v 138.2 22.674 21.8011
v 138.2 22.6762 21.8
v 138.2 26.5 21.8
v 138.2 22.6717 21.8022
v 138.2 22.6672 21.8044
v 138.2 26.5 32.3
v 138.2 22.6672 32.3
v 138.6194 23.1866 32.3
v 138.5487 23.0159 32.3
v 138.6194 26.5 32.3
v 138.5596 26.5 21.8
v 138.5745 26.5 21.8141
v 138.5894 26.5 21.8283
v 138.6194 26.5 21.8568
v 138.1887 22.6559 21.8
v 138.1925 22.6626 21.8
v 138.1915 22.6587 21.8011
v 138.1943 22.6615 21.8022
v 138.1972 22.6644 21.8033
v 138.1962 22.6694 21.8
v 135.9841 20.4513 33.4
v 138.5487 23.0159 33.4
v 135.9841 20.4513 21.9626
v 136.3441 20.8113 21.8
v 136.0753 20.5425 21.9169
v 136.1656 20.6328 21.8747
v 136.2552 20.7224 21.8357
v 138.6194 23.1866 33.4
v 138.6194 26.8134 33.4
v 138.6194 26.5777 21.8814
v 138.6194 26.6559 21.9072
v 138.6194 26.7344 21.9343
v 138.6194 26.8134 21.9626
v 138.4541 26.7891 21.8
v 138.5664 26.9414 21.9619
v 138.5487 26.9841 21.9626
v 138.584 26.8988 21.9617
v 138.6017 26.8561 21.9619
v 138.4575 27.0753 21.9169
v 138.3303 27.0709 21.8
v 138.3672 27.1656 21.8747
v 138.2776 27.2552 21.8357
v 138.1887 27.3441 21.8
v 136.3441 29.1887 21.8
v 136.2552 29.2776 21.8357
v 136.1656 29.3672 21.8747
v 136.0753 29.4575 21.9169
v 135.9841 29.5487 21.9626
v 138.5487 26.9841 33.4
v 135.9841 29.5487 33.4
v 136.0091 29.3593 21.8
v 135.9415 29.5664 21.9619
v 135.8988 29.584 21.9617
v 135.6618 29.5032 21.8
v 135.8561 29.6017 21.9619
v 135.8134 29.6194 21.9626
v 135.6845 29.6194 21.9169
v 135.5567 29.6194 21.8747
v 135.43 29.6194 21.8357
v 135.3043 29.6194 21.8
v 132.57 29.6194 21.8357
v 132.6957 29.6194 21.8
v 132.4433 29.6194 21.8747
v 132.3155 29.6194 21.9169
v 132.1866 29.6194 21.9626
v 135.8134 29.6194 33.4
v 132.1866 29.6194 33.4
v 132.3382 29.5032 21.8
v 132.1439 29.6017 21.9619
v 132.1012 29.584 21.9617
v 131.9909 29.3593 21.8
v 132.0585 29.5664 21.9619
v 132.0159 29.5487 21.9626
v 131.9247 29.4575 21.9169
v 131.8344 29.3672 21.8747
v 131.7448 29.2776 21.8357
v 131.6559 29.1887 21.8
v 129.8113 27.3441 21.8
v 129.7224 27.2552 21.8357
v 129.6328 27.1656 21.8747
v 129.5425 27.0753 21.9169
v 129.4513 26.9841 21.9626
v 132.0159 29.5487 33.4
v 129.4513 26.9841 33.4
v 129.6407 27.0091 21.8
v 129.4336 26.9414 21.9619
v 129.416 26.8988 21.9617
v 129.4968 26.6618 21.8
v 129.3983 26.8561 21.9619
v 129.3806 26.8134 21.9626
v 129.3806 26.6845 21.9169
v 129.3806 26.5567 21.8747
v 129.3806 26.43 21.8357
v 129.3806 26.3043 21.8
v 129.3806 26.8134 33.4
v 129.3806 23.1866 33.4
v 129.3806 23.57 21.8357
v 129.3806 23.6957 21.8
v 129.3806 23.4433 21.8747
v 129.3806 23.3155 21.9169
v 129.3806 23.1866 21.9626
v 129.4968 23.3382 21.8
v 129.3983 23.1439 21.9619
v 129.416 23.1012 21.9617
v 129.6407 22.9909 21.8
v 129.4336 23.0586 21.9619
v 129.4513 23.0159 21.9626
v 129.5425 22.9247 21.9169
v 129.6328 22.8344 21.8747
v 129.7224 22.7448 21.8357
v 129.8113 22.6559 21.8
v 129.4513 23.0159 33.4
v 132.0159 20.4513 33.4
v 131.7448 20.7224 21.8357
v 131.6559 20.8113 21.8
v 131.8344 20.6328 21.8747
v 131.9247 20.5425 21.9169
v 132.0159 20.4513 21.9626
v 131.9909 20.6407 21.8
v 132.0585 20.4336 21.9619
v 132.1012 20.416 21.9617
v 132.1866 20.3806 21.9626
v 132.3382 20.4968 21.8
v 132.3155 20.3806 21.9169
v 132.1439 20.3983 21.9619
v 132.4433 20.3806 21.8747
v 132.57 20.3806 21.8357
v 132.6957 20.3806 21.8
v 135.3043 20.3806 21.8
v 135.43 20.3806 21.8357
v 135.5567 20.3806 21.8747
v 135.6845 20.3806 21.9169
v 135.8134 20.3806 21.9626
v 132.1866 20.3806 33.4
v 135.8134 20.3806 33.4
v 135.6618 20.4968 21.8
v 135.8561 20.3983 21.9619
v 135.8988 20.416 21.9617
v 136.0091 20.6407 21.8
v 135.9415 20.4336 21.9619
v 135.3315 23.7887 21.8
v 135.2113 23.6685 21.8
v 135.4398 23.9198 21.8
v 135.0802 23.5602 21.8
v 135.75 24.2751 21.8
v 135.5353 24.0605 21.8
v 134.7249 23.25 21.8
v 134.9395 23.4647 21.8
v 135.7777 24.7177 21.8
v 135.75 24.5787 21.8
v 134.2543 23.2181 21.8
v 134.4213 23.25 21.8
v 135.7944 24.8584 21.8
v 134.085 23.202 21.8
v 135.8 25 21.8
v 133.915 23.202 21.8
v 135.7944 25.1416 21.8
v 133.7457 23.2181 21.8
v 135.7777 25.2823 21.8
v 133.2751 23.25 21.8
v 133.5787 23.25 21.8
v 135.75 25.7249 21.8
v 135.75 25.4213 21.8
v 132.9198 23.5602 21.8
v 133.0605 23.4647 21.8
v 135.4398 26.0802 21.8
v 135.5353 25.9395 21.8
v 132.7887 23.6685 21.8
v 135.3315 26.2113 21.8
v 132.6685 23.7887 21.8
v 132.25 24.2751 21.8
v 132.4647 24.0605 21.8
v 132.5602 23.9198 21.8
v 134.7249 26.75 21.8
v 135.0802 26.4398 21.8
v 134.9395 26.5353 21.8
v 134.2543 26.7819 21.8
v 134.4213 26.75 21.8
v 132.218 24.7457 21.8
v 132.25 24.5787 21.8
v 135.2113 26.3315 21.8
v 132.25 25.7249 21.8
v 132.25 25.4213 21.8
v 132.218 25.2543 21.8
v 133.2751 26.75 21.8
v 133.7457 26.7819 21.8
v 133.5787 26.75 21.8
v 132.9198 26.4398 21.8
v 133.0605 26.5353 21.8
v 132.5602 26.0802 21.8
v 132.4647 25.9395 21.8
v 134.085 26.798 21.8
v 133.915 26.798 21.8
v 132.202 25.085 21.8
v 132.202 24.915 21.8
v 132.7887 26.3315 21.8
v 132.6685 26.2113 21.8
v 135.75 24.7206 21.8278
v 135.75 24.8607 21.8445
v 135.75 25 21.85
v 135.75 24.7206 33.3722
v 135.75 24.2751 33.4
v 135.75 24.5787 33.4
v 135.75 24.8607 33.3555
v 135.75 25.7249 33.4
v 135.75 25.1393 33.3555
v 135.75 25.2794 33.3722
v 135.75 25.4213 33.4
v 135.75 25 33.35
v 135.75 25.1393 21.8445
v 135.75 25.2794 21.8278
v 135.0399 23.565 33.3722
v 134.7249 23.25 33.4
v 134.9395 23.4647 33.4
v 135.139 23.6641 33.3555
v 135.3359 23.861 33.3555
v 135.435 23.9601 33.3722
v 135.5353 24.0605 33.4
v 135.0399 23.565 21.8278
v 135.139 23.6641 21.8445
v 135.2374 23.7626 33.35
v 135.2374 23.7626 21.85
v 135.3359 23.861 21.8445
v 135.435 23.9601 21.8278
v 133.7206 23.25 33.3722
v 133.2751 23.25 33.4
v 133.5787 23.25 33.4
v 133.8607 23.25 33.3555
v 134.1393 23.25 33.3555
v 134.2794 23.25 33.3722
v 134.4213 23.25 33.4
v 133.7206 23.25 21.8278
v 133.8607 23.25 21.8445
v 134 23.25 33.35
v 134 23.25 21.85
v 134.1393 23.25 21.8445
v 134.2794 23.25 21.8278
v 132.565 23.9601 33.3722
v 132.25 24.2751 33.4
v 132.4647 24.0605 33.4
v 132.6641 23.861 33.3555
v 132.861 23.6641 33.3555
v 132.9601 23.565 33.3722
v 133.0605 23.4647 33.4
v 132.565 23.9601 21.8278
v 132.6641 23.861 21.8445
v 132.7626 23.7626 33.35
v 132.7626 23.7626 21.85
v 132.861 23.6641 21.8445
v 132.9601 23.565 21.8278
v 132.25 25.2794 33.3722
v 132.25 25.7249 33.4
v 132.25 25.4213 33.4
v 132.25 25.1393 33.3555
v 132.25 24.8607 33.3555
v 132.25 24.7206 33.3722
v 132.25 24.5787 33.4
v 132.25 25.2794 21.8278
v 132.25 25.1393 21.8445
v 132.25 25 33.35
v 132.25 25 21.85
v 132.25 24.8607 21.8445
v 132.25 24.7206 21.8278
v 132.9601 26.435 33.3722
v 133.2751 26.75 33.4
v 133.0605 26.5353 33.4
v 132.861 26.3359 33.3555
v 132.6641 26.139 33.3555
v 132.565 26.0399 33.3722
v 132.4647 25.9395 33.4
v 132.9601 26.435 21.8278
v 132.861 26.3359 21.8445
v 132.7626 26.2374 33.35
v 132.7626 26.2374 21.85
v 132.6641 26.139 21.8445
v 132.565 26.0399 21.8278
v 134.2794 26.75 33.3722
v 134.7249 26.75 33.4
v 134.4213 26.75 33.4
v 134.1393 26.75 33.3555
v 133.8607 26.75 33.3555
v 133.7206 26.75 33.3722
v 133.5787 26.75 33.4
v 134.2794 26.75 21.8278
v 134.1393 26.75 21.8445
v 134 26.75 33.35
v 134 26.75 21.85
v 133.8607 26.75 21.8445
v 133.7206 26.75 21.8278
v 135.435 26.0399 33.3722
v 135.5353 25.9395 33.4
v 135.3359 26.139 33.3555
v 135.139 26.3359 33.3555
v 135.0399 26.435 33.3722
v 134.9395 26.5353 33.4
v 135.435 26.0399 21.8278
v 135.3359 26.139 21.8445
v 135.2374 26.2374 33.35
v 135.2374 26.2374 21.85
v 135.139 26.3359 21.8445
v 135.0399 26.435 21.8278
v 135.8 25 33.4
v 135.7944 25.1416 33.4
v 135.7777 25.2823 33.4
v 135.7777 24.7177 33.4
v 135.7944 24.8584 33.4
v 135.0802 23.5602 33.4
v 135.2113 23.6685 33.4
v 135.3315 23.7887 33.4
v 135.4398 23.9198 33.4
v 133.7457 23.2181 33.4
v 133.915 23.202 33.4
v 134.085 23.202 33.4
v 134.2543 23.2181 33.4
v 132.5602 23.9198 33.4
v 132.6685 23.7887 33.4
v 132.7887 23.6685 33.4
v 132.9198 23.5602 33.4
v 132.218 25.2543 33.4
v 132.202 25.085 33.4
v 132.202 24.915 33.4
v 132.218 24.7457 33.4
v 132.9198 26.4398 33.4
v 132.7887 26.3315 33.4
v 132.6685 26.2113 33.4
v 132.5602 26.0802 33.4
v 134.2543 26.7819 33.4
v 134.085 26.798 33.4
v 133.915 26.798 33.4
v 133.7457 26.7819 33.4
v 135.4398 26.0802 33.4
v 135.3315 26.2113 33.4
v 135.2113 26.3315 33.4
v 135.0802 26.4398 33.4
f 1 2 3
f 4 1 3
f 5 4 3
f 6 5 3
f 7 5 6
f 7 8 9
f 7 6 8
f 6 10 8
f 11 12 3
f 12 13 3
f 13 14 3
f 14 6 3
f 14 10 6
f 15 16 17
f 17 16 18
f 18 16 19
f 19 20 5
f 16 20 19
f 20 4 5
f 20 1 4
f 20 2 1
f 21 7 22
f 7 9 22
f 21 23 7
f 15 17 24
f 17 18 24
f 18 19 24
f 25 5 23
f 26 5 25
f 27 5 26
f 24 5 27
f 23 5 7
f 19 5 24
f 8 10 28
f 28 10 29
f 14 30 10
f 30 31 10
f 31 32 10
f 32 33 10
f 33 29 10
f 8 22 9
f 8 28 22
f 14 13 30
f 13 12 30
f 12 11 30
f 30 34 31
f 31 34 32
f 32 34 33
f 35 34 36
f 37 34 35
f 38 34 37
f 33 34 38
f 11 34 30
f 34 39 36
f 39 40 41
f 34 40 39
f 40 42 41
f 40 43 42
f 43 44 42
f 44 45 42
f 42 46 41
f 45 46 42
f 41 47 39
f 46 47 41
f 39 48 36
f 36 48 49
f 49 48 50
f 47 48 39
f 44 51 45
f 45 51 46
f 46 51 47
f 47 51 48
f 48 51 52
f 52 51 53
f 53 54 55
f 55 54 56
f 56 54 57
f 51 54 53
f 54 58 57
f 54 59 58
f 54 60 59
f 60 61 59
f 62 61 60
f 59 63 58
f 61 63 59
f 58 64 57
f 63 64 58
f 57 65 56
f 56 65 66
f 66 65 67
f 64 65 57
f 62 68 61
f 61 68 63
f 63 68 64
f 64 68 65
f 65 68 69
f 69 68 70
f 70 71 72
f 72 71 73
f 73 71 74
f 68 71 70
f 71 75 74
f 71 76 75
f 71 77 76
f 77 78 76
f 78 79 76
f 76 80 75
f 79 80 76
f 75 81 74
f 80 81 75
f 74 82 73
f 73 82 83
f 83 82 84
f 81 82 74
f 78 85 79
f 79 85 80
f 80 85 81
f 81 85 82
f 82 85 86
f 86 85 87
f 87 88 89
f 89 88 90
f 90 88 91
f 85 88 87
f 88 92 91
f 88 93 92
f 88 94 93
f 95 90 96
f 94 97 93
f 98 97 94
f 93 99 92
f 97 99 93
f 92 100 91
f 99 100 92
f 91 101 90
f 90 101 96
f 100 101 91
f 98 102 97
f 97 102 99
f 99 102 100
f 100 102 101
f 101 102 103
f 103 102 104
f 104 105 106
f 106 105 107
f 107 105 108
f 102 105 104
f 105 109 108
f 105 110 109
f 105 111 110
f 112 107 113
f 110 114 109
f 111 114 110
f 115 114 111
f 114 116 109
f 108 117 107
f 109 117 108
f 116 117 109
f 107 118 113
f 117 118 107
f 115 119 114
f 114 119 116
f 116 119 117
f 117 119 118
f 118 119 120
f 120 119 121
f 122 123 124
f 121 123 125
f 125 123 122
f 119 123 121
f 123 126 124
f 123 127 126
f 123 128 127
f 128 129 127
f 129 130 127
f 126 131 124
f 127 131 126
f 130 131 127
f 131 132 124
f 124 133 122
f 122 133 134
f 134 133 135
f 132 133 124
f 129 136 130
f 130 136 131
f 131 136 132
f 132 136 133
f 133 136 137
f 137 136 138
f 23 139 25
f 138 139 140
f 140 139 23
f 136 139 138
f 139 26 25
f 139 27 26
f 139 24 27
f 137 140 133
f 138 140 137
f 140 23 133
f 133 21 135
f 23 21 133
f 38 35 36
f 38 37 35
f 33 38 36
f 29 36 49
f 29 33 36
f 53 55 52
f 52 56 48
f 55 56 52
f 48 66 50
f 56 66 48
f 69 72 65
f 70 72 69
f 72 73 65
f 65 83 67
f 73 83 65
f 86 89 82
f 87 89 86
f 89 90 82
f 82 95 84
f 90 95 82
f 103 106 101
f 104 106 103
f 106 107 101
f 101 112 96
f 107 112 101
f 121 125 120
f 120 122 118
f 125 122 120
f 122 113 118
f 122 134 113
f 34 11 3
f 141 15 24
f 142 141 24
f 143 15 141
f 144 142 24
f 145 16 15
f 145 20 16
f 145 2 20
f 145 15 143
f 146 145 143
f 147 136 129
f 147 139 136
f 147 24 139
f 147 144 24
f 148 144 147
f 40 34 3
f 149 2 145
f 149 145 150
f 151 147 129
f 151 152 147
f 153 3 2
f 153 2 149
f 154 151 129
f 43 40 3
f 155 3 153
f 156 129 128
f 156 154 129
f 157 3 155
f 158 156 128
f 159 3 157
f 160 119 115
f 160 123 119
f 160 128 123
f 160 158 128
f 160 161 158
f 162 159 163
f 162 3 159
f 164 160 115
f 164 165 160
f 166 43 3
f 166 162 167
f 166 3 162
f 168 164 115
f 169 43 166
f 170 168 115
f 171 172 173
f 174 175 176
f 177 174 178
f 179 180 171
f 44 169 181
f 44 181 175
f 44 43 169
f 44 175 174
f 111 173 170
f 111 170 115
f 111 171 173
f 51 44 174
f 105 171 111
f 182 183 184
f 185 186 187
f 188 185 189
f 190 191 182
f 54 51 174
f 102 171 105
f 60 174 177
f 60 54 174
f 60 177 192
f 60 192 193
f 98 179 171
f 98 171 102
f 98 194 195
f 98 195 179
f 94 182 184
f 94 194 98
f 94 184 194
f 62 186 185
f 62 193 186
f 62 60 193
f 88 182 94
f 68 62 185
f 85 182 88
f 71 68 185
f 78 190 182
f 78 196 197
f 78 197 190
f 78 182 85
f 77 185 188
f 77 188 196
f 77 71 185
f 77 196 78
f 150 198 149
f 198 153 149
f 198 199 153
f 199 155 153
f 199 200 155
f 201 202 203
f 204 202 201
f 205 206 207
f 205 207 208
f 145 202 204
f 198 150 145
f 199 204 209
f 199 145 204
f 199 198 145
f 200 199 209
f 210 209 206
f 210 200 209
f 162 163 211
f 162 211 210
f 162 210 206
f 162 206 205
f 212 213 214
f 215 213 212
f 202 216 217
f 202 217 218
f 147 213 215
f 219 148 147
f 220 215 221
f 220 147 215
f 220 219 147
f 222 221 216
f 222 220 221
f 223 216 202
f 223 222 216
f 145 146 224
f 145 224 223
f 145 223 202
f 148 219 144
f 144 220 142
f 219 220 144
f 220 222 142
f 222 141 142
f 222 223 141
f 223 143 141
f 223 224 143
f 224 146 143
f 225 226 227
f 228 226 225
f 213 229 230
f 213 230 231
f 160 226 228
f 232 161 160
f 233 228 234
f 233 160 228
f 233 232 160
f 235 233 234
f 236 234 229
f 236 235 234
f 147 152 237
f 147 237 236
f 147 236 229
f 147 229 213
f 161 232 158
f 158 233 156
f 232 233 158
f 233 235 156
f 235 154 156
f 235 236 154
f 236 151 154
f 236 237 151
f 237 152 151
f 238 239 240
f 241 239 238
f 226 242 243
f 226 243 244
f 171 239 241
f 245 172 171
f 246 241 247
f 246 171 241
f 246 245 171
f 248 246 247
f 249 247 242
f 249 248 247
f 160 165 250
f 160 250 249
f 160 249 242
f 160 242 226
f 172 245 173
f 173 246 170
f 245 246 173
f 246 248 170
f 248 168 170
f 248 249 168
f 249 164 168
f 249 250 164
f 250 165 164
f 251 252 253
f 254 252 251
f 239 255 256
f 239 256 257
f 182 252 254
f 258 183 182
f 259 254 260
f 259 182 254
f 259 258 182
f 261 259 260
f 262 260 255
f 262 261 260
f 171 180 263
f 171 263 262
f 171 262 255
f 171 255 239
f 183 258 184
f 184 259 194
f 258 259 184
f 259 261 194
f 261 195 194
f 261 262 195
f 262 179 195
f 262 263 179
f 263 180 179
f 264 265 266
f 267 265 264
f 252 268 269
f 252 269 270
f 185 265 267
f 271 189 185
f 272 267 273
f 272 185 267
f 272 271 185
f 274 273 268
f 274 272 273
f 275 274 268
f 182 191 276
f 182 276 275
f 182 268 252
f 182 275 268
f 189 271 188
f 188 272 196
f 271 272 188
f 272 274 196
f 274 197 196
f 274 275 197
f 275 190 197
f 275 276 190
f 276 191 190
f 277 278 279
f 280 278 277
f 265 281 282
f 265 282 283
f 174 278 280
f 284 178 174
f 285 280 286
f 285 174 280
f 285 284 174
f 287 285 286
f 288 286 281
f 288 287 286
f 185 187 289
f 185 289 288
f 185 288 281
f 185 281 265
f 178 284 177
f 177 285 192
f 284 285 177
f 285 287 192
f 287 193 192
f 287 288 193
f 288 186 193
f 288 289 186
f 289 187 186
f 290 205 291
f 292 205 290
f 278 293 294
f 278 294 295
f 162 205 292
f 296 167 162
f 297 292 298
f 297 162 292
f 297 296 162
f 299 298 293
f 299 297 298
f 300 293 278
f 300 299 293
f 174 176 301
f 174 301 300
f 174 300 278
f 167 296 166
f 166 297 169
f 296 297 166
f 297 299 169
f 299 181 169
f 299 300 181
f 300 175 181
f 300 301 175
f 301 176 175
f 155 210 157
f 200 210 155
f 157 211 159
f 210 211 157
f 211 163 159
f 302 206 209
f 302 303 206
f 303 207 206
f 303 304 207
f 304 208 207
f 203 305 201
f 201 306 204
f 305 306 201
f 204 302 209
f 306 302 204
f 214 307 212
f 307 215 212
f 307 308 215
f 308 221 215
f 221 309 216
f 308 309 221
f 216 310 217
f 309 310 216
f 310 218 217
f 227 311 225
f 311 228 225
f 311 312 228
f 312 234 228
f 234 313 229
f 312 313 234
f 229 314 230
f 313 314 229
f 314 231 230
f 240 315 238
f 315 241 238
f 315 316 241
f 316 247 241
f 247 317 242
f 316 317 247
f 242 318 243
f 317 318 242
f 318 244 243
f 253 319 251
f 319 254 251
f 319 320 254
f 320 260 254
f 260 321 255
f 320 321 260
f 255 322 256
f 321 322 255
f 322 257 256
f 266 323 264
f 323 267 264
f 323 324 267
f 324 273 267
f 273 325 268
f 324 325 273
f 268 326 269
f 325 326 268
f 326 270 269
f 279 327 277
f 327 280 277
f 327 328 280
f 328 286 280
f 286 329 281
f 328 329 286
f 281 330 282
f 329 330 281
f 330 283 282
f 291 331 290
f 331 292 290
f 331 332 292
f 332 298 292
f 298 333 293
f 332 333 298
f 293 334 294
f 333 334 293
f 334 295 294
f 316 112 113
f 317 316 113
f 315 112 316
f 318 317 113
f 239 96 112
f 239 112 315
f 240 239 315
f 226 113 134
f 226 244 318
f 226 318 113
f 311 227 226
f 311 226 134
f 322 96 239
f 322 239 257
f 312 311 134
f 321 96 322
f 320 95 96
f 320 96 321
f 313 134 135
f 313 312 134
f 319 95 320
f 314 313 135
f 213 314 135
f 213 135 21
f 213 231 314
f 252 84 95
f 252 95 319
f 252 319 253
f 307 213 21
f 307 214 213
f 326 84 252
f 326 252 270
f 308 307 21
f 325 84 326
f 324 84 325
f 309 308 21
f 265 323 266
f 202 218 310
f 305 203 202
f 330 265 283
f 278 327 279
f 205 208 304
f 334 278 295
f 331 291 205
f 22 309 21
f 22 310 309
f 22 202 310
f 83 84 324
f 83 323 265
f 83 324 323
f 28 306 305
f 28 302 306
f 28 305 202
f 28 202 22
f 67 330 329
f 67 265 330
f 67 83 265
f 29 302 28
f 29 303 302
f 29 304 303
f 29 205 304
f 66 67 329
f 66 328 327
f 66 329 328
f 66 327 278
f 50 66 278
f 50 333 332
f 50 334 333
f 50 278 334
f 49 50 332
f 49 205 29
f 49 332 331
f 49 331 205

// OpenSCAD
// Generated by the canonical parent Python sources and validated exchange pipeline.
polyhedron(points=[[138.1999969482422, 22.673954010009766, 21.80109214782715], [138.1999969482422, 22.676210403442383, 21.799999237060547], [138.1999969482422, 26.5, 21.799999237060547], [138.1999969482422, 22.67169952392578, 21.80218505859375], [138.1999969482422, 22.667184829711914, 21.80437469482422], [138.1999969482422, 26.5, 32.29999923706055], [138.1999969482422, 22.667184829711914, 32.29999923706055], [138.61940002441406, 23.186582565307617, 32.29999923706055], [138.54869079589844, 23.015872955322266, 32.29999923706055], [138.61940002441406, 26.5, 32.29999923706055], [138.55960083007812, 26.5, 21.799999237060547], [138.57449340820312, 26.5, 21.814138412475586], [138.58941650390625, 26.5, 21.828325271606445], [138.61940002441406, 26.5, 21.856834411621094], [138.1886749267578, 22.65586280822754, 21.799999237060547], [138.1924591064453, 22.662639617919922, 21.799999237060547], [138.19151306152344, 22.658693313598633, 21.801088333129883], [138.1943359375, 22.661521911621094, 21.802181243896484], [138.19717407226562, 22.66435432434082, 21.80327606201172], [138.1962432861328, 22.669422149658203, 21.799999237060547], [135.984130859375, 20.451313018798828, 33.400001525878906], [138.54869079589844, 23.015872955322266, 33.400001525878906], [135.984130859375, 20.451313018798828, 21.96259117126465], [136.34413146972656, 20.811323165893555, 21.799999237060547], [136.07528686523438, 20.542470932006836, 21.916948318481445], [136.16563415527344, 20.6328182220459, 21.874652862548828], [136.25523376464844, 20.722414016723633, 21.83568000793457], [138.61940002441406, 23.186582565307617, 33.400001525878906], [138.61940002441406, 26.813417434692383, 33.400001525878906], [138.61940002441406, 26.57773208618164, 21.88140106201172], [138.61940002441406, 26.655864715576172, 21.907211303710938], [138.61940002441406, 26.734418869018555, 21.93427276611328], [138.61940002441406, 26.813417434692383, 21.96259117126465], [138.4541015625, 26.789119720458984, 21.799999237060547], [138.5663604736328, 26.941448211669922, 21.961946487426758], [138.54869079589844, 26.984127044677734, 21.96259117126465], [138.58404541015625, 26.898773193359375, 21.96173095703125], [138.60171508789062, 26.856096267700195, 21.961946487426758], [138.45753479003906, 27.075284957885742, 21.916948318481445], [138.33029174804688, 27.070884704589844, 21.799999237060547], [138.3671875, 27.165632247924805, 21.874652862548828], [138.277587890625, 27.255229949951172, 21.83568000793457], [138.1886749267578, 27.34413719177246, 21.799999237060547], [136.34413146972656, 29.188676834106445, 21.799999237060547], [136.25523376464844, 29.277585983276367, 21.83568000793457], [136.16563415527344, 29.3671817779541, 21.874652862548828], [136.07528686523438, 29.457529067993164, 21.916948318481445], [135.984130859375, 29.548686981201172, 21.96259117126465], [138.54869079589844, 26.984127044677734, 33.400001525878906], [135.984130859375, 29.548686981201172, 33.400001525878906], [136.00914001464844, 29.35928726196289, 21.799999237060547], [135.9414520263672, 29.56636619567871, 21.961946487426758], [135.89877319335938, 29.584041595458984, 21.96173095703125], [135.66180419921875, 29.50315284729004, 21.799999237060547], [135.85609436035156, 29.60171890258789, 21.961946487426758], [135.81341552734375, 29.61939811706543, 21.96259117126465], [135.6844940185547, 29.61939811706543, 21.916948318481445], [135.55673217773438, 29.61939811706543, 21.874652862548828], [135.43002319335938, 29.61939811706543, 21.83568000793457], [135.30429077148438, 29.61939811706543, 21.799999237060547], [132.56997680664062, 29.61939811706543, 21.83568000793457], [132.69570922851562, 29.61939811706543, 21.799999237060547], [132.44326782226562, 29.61939811706543, 21.874652862548828], [132.3155059814453, 29.61939811706543, 21.916948318481445], [132.18658447265625, 29.61939811706543, 21.96259117126465], [135.81341552734375, 29.61939811706543, 33.400001525878906], [132.18658447265625, 29.61939811706543, 33.400001525878906], [132.33819580078125, 29.50315284729004, 21.799999237060547], [132.14390563964844, 29.60171890258789, 21.961946487426758], [132.10122680664062, 29.584041595458984, 21.96173095703125], [131.99085998535156, 29.35928726196289, 21.799999237060547], [132.0585479736328, 29.56636619567871, 21.961946487426758], [132.015869140625, 29.548686981201172, 21.96259117126465], [131.92471313476562, 29.457529067993164, 21.916948318481445], [131.83436584472656, 29.3671817779541, 21.874652862548828], [131.74476623535156, 29.277585983276367, 21.83568000793457], [131.65586853027344, 29.188676834106445, 21.799999237060547], [129.8113250732422, 27.34413719177246, 21.799999237060547], [129.722412109375, 27.255229949951172, 21.83568000793457], [129.6328125, 27.165632247924805, 21.874652862548828], [129.54246520996094, 27.075284957885742, 21.916948318481445], [129.45130920410156, 26.984127044677734, 21.96259117126465], [132.015869140625, 29.548686981201172, 33.400001525878906], [129.45130920410156, 26.984127044677734, 33.400001525878906], [129.64071655273438, 27.00913429260254, 21.799999237060547], [129.4336395263672, 26.941448211669922, 21.961946487426758], [129.41595458984375, 26.898773193359375, 21.96173095703125], [129.49684143066406, 26.661808013916016, 21.799999237060547], [129.39828491210938, 26.856096267700195, 21.961946487426758], [129.38059997558594, 26.813417434692383, 21.96259117126465], [129.38059997558594, 26.684499740600586, 21.916948318481445], [129.38059997558594, 26.556730270385742, 21.874652862548828], [129.38059997558594, 26.430021286010742, 21.83568000793457], [129.38059997558594, 26.30428695678711, 21.799999237060547], [129.38059997558594, 26.813417434692383, 33.400001525878906], [129.38059997558594, 23.186582565307617, 33.400001525878906], [129.38059997558594, 23.569978713989258, 21.83568000793457], [129.38059997558594, 23.69571304321289, 21.799999237060547], [129.38059997558594, 23.443269729614258, 21.874652862548828], [129.38059997558594, 23.315500259399414, 21.916948318481445], [129.38059997558594, 23.186582565307617, 21.96259117126465], [129.49684143066406, 23.338191986083984, 21.799999237060547], [129.39828491210938, 23.143903732299805, 21.961946487426758], [129.41595458984375, 23.101226806640625, 21.96173095703125], [129.64071655273438, 22.99086570739746, 21.799999237060547], [129.4336395263672, 23.058551788330078, 21.961946487426758], [129.45130920410156, 23.015872955322266, 21.96259117126465], [129.54246520996094, 22.924715042114258, 21.916948318481445], [129.6328125, 22.834367752075195, 21.874652862548828], [129.722412109375, 22.744770050048828, 21.83568000793457], [129.8113250732422, 22.65586280822754, 21.799999237060547], [129.45130920410156, 23.015872955322266, 33.400001525878906], [132.015869140625, 20.451313018798828, 33.400001525878906], [131.74476623535156, 20.722414016723633, 21.83568000793457], [131.65586853027344, 20.811323165893555, 21.799999237060547], [131.83436584472656, 20.6328182220459, 21.874652862548828], [131.92471313476562, 20.542470932006836, 21.916948318481445], [132.015869140625, 20.451313018798828, 21.96259117126465], [131.99085998535156, 20.64071273803711, 21.799999237060547], [132.0585479736328, 20.43363380432129, 21.961946487426758], [132.10122680664062, 20.415958404541016, 21.96173095703125], [132.18658447265625, 20.38060188293457, 21.96259117126465], [132.33819580078125, 20.49684715270996, 21.799999237060547], [132.3155059814453, 20.38060188293457, 21.916948318481445], [132.14390563964844, 20.39828109741211, 21.961946487426758], [132.44326782226562, 20.38060188293457, 21.874652862548828], [132.56997680664062, 20.38060188293457, 21.83568000793457], [132.69570922851562, 20.38060188293457, 21.799999237060547], [135.30429077148438, 20.38060188293457, 21.799999237060547], [135.43002319335938, 20.38060188293457, 21.83568000793457], [135.55673217773438, 20.38060188293457, 21.874652862548828], [135.6844940185547, 20.38060188293457, 21.916948318481445], [135.81341552734375, 20.38060188293457, 21.96259117126465], [132.18658447265625, 20.38060188293457, 33.400001525878906], [135.81341552734375, 20.38060188293457, 33.400001525878906], [135.66180419921875, 20.49684715270996, 21.799999237060547], [135.85609436035156, 20.39828109741211, 21.961946487426758], [135.89877319335938, 20.415958404541016, 21.96173095703125], [136.00914001464844, 20.64071273803711, 21.799999237060547], [135.9414520263672, 20.43363380432129, 21.961946487426758], [135.33148193359375, 23.788745880126953, 21.799999237060547], [135.2112579345703, 23.66851043701172, 21.799999237060547], [135.43983459472656, 23.919790267944336, 21.799999237060547], [135.08021545410156, 23.560157775878906, 21.799999237060547], [135.75, 24.27512550354004, 21.799999237060547], [135.53533935546875, 24.06047248840332, 21.799999237060547], [134.72486877441406, 23.25, 21.799999237060547], [134.9395294189453, 23.46465301513672, 21.799999237060547], [135.77772521972656, 24.717668533325195, 21.799999237060547], [135.75, 24.578693389892578, 21.799999237060547], [134.25430297851562, 23.218053817749023, 21.799999237060547], [134.4213104248047, 23.25, 21.799999237060547], [135.79441833496094, 24.858396530151367, 21.799999237060547], [134.08502197265625, 23.202009201049805, 21.799999237060547], [135.8000030517578, 25.0, 21.799999237060547], [133.91497802734375, 23.202009201049805, 21.799999237060547], [135.79441833496094, 25.141603469848633, 21.799999237060547], [133.74569702148438, 23.218053817749023, 21.799999237060547], [135.77772521972656, 25.282331466674805, 21.799999237060547], [133.27513122558594, 23.25, 21.799999237060547], [133.5786895751953, 23.25, 21.799999237060547], [135.75, 25.72487449645996, 21.799999237060547], [135.75, 25.421306610107422, 21.799999237060547], [132.91978454589844, 23.560157775878906, 21.799999237060547], [133.0604705810547, 23.46465301513672, 21.799999237060547], [135.43983459472656, 26.080209732055664, 21.799999237060547], [135.53533935546875, 25.93952751159668, 21.799999237060547], [132.7887420654297, 23.66851043701172, 21.799999237060547], [135.33148193359375, 26.211254119873047, 21.799999237060547], [132.66851806640625, 23.788745880126953, 21.799999237060547], [132.25, 24.27512550354004, 21.799999237060547], [132.46466064453125, 24.06047248840332, 21.799999237060547], [132.56016540527344, 23.919790267944336, 21.799999237060547], [134.72486877441406, 26.75, 21.799999237060547], [135.08021545410156, 26.439842224121094, 21.799999237060547], [134.9395294189453, 26.53534698486328, 21.799999237060547], [134.25430297851562, 26.781946182250977, 21.799999237060547], [134.4213104248047, 26.75, 21.799999237060547], [132.21804809570312, 24.745702743530273, 21.799999237060547], [132.25, 24.578693389892578, 21.799999237060547], [135.2112579345703, 26.33148956298828, 21.799999237060547], [132.25, 25.72487449645996, 21.799999237060547], [132.25, 25.421306610107422, 21.799999237060547], [132.21804809570312, 25.254297256469727, 21.799999237060547], [133.27513122558594, 26.75, 21.799999237060547], [133.74569702148438, 26.781946182250977, 21.799999237060547], [133.5786895751953, 26.75, 21.799999237060547], [132.91978454589844, 26.439842224121094, 21.799999237060547], [133.0604705810547, 26.53534698486328, 21.799999237060547], [132.56016540527344, 26.080209732055664, 21.799999237060547], [132.46466064453125, 25.93952751159668, 21.799999237060547], [134.08502197265625, 26.797990798950195, 21.799999237060547], [133.91497802734375, 26.797990798950195, 21.799999237060547], [132.20201110839844, 25.085018157958984, 21.799999237060547], [132.20201110839844, 24.914981842041016, 21.799999237060547], [132.7887420654297, 26.33148956298828, 21.799999237060547], [132.66851806640625, 26.211254119873047, 21.799999237060547], [135.75, 24.720600128173828, 21.827836990356445], [135.75, 24.860740661621094, 21.844467163085938], [135.75, 25.0, 21.850000381469727], [135.75, 24.720600128173828, 33.37216567993164], [135.75, 24.27512550354004, 33.400001525878906], [135.75, 24.578693389892578, 33.400001525878906], [135.75, 24.860740661621094, 33.355533599853516], [135.75, 25.72487449645996, 33.400001525878906], [135.75, 25.139259338378906, 33.355533599853516], [135.75, 25.279399871826172, 33.37216567993164], [135.75, 25.421306610107422, 33.400001525878906], [135.75, 25.0, 33.349998474121094], [135.75, 25.139259338378906, 21.844467163085938], [135.75, 25.279399871826172, 21.827836990356445], [135.0398712158203, 23.56499671936035, 33.37216567993164], [134.72486877441406, 23.25, 33.400001525878906], [134.9395294189453, 23.46465301513672, 33.400001525878906], [135.1389617919922, 23.664091110229492, 33.355533599853516], [135.33590698242188, 23.861034393310547, 33.355533599853516], [135.43499755859375, 23.960128784179688, 33.37216567993164], [135.53533935546875, 24.06047248840332, 33.400001525878906], [135.0398712158203, 23.56499671936035, 21.827836990356445], [135.1389617919922, 23.664091110229492, 21.844467163085938], [135.23744201660156, 23.762563705444336, 33.349998474121094], [135.23744201660156, 23.762563705444336, 21.850000381469727], [135.33590698242188, 23.861034393310547, 21.844467163085938], [135.43499755859375, 23.960128784179688, 21.827836990356445], [133.72059631347656, 23.25, 33.37216567993164], [133.27513122558594, 23.25, 33.400001525878906], [133.5786895751953, 23.25, 33.400001525878906], [133.86073303222656, 23.25, 33.355533599853516], [134.13926696777344, 23.25, 33.355533599853516], [134.27940368652344, 23.25, 33.37216567993164], [134.4213104248047, 23.25, 33.400001525878906], [133.72059631347656, 23.25, 21.827836990356445], [133.86073303222656, 23.25, 21.844467163085938], [134.0, 23.25, 33.349998474121094], [134.0, 23.25, 21.850000381469727], [134.13926696777344, 23.25, 21.844467163085938], [134.27940368652344, 23.25, 21.827836990356445], [132.56500244140625, 23.960128784179688, 33.37216567993164], [132.25, 24.27512550354004, 33.400001525878906], [132.46466064453125, 24.06047248840332, 33.400001525878906], [132.66409301757812, 23.861034393310547, 33.355533599853516], [132.8610382080078, 23.664091110229492, 33.355533599853516], [132.9601287841797, 23.56499671936035, 33.37216567993164], [133.0604705810547, 23.46465301513672, 33.400001525878906], [132.56500244140625, 23.960128784179688, 21.827836990356445], [132.66409301757812, 23.861034393310547, 21.844467163085938], [132.76255798339844, 23.762563705444336, 33.349998474121094], [132.76255798339844, 23.762563705444336, 21.850000381469727], [132.8610382080078, 23.664091110229492, 21.844467163085938], [132.9601287841797, 23.56499671936035, 21.827836990356445], [132.25, 25.279399871826172, 33.37216567993164], [132.25, 25.72487449645996, 33.400001525878906], [132.25, 25.421306610107422, 33.400001525878906], [132.25, 25.139259338378906, 33.355533599853516], [132.25, 24.860740661621094, 33.355533599853516], [132.25, 24.720600128173828, 33.37216567993164], [132.25, 24.578693389892578, 33.400001525878906], [132.25, 25.279399871826172, 21.827836990356445], [132.25, 25.139259338378906, 21.844467163085938], [132.25, 25.0, 33.349998474121094], [132.25, 25.0, 21.850000381469727], [132.25, 24.860740661621094, 21.844467163085938], [132.25, 24.720600128173828, 21.827836990356445], [132.9601287841797, 26.43500328063965, 33.37216567993164], [133.27513122558594, 26.75, 33.400001525878906], [133.0604705810547, 26.53534698486328, 33.400001525878906], [132.8610382080078, 26.335908889770508, 33.355533599853516], [132.66409301757812, 26.138965606689453, 33.355533599853516], [132.56500244140625, 26.039871215820312, 33.37216567993164], [132.46466064453125, 25.93952751159668, 33.400001525878906], [132.9601287841797, 26.43500328063965, 21.827836990356445], [132.8610382080078, 26.335908889770508, 21.844467163085938], [132.76255798339844, 26.237436294555664, 33.349998474121094], [132.76255798339844, 26.237436294555664, 21.850000381469727], [132.66409301757812, 26.138965606689453, 21.844467163085938], [132.56500244140625, 26.039871215820312, 21.827836990356445], [134.27940368652344, 26.75, 33.37216567993164], [134.72486877441406, 26.75, 33.400001525878906], [134.4213104248047, 26.75, 33.400001525878906], [134.13926696777344, 26.75, 33.355533599853516], [133.86073303222656, 26.75, 33.355533599853516], [133.72059631347656, 26.75, 33.37216567993164], [133.5786895751953, 26.75, 33.400001525878906], [134.27940368652344, 26.75, 21.827836990356445], [134.13926696777344, 26.75, 21.844467163085938], [134.0, 26.75, 33.349998474121094], [134.0, 26.75, 21.850000381469727], [133.86073303222656, 26.75, 21.844467163085938], [133.72059631347656, 26.75, 21.827836990356445], [135.43499755859375, 26.039871215820312, 33.37216567993164], [135.53533935546875, 25.93952751159668, 33.400001525878906], [135.33590698242188, 26.138965606689453, 33.355533599853516], [135.1389617919922, 26.335908889770508, 33.355533599853516], [135.0398712158203, 26.43500328063965, 33.37216567993164], [134.9395294189453, 26.53534698486328, 33.400001525878906], [135.43499755859375, 26.039871215820312, 21.827836990356445], [135.33590698242188, 26.138965606689453, 21.844467163085938], [135.23744201660156, 26.237436294555664, 33.349998474121094], [135.23744201660156, 26.237436294555664, 21.850000381469727], [135.1389617919922, 26.335908889770508, 21.844467163085938], [135.0398712158203, 26.43500328063965, 21.827836990356445], [135.8000030517578, 25.0, 33.400001525878906], [135.79441833496094, 25.141603469848633, 33.400001525878906], [135.77772521972656, 25.282331466674805, 33.400001525878906], [135.77772521972656, 24.717668533325195, 33.400001525878906], [135.79441833496094, 24.858396530151367, 33.400001525878906], [135.08021545410156, 23.560157775878906, 33.400001525878906], [135.2112579345703, 23.66851043701172, 33.400001525878906], [135.33148193359375, 23.788745880126953, 33.400001525878906], [135.43983459472656, 23.919790267944336, 33.400001525878906], [133.74569702148438, 23.218053817749023, 33.400001525878906], [133.91497802734375, 23.202009201049805, 33.400001525878906], [134.08502197265625, 23.202009201049805, 33.400001525878906], [134.25430297851562, 23.218053817749023, 33.400001525878906], [132.56016540527344, 23.919790267944336, 33.400001525878906], [132.66851806640625, 23.788745880126953, 33.400001525878906], [132.7887420654297, 23.66851043701172, 33.400001525878906], [132.91978454589844, 23.560157775878906, 33.400001525878906], [132.21804809570312, 25.254297256469727, 33.400001525878906], [132.20201110839844, 25.085018157958984, 33.400001525878906], [132.20201110839844, 24.914981842041016, 33.400001525878906], [132.21804809570312, 24.745702743530273, 33.400001525878906], [132.91978454589844, 26.439842224121094, 33.400001525878906], [132.7887420654297, 26.33148956298828, 33.400001525878906], [132.66851806640625, 26.211254119873047, 33.400001525878906], [132.56016540527344, 26.080209732055664, 33.400001525878906], [134.25430297851562, 26.781946182250977, 33.400001525878906], [134.08502197265625, 26.797990798950195, 33.400001525878906], [133.91497802734375, 26.797990798950195, 33.400001525878906], [133.74569702148438, 26.781946182250977, 33.400001525878906], [135.43983459472656, 26.080209732055664, 33.400001525878906], [135.33148193359375, 26.211254119873047, 33.400001525878906], [135.2112579345703, 26.33148956298828, 33.400001525878906], [135.08021545410156, 26.439842224121094, 33.400001525878906]],faces=[[2, 1, 0], [2, 0, 3], [2, 3, 4], [2, 4, 5], [5, 4, 6], [8, 7, 6], [7, 5, 6], [7, 9, 5], [2, 11, 10], [2, 12, 11], [2, 13, 12], [2, 5, 13], [5, 9, 13], [16, 15, 14], [17, 15, 16], [18, 15, 17], [4, 19, 18], [18, 19, 15], [4, 3, 19], [3, 0, 19], [0, 1, 19], [21, 6, 20], [21, 8, 6], [6, 22, 20], [23, 16, 14], [23, 17, 16], [23, 18, 17], [22, 4, 24], [24, 4, 25], [25, 4, 26], [26, 4, 23], [6, 4, 22], [23, 4, 18], [27, 9, 7], [28, 9, 27], [9, 29, 13], [9, 30, 29], [9, 31, 30], [9, 32, 31], [9, 28, 32], [8, 21, 7], [21, 27, 7], [29, 12, 13], [29, 11, 12], [29, 10, 11], [30, 33, 29], [31, 33, 30], [32, 33, 31], [35, 33, 34], [34, 33, 36], [36, 33, 37], [37, 33, 32], [29, 33, 10], [35, 38, 33], [40, 39, 38], [38, 39, 33], [40, 41, 39], [41, 42, 39], [41, 43, 42], [41, 44, 43], [40, 45, 41], [41, 45, 44], [38, 46, 40], [40, 46, 45], [35, 47, 38], [48, 47, 35], [49, 47, 48], [38, 47, 46], [44, 50, 43], [45, 50, 44], [46, 50, 45], [47, 50, 46], [51, 50, 47], [52, 50, 51], [54, 53, 52], [55, 53, 54], [56, 53, 55], [52, 53, 50], [56, 57, 53], [57, 58, 53], [58, 59, 53], [58, 60, 59], [59, 60, 61], [57, 62, 58], [58, 62, 60], [56, 63, 57], [57, 63, 62], [55, 64, 56], [65, 64, 55], [66, 64, 65], [56, 64, 63], [60, 67, 61], [62, 67, 60], [63, 67, 62], [64, 67, 63], [68, 67, 64], [69, 67, 68], [71, 70, 69], [72, 70, 71], [73, 70, 72], [69, 70, 67], [73, 74, 70], [74, 75, 70], [75, 76, 70], [75, 77, 76], [75, 78, 77], [74, 79, 75], [75, 79, 78], [73, 80, 74], [74, 80, 79], [72, 81, 73], [82, 81, 72], [83, 81, 82], [73, 81, 80], [78, 84, 77], [79, 84, 78], [80, 84, 79], [81, 84, 80], [85, 84, 81], [86, 84, 85], [88, 87, 86], [89, 87, 88], [90, 87, 89], [86, 87, 84], [90, 91, 87], [91, 92, 87], [92, 93, 87], [95, 89, 94], [92, 96, 93], [93, 96, 97], [91, 98, 92], [92, 98, 96], [90, 99, 91], [91, 99, 98], [89, 100, 90], [95, 100, 89], [90, 100, 99], [96, 101, 97], [98, 101, 96], [99, 101, 98], [100, 101, 99], [102, 101, 100], [103, 101, 102], [105, 104, 103], [106, 104, 105], [107, 104, 106], [103, 104, 101], [107, 108, 104], [108, 109, 104], [109, 110, 104], [112, 106, 111], [108, 113, 109], [109, 113, 110], [110, 113, 114], [108, 115, 113], [106, 116, 107], [107, 116, 108], [108, 116, 115], [112, 117, 106], [106, 117, 116], [113, 118, 114], [115, 118, 113], [116, 118, 115], [117, 118, 116], [119, 118, 117], [120, 118, 119], [123, 122, 121], [124, 122, 120], [121, 122, 124], [120, 122, 118], [123, 125, 122], [125, 126, 122], [126, 127, 122], [126, 128, 127], [126, 129, 128], [123, 130, 125], [125, 130, 126], [126, 130, 129], [123, 131, 130], [121, 132, 123], [133, 132, 121], [134, 132, 133], [123, 132, 131], [129, 135, 128], [130, 135, 129], [131, 135, 130], [132, 135, 131], [136, 135, 132], [137, 135, 136], [24, 138, 22], [139, 138, 137], [22, 138, 139], [137, 138, 135], [24, 25, 138], [25, 26, 138], [26, 23, 138], [132, 139, 136], [136, 139, 137], [132, 22, 139], [134, 20, 132], [132, 20, 22], [35, 34, 37], [34, 36, 37], [35, 37, 32], [48, 35, 28], [35, 32, 28], [51, 54, 52], [47, 55, 51], [51, 55, 54], [49, 65, 47], [47, 65, 55], [64, 71, 68], [68, 71, 69], [64, 72, 71], [66, 82, 64], [64, 82, 72], [81, 88, 85], [85, 88, 86], [81, 89, 88], [83, 94, 81], [81, 94, 89], [100, 105, 102], [102, 105, 103], [100, 106, 105], [95, 111, 100], [100, 111, 106], [119, 124, 120], [117, 121, 119], [119, 121, 124], [117, 112, 121], [112, 133, 121], [2, 10, 33], [23, 14, 140], [23, 140, 141], [140, 14, 142], [23, 141, 143], [14, 15, 144], [15, 19, 144], [19, 1, 144], [142, 14, 144], [142, 144, 145], [128, 135, 146], [135, 138, 146], [138, 23, 146], [23, 143, 146], [146, 143, 147], [2, 33, 39], [144, 1, 148], [149, 144, 148], [128, 146, 150], [146, 151, 150], [1, 2, 152], [148, 1, 152], [128, 150, 153], [2, 39, 42], [152, 2, 154], [127, 128, 155], [128, 153, 155], [154, 2, 156], [127, 155, 157], [156, 2, 158], [114, 118, 159], [118, 122, 159], [122, 127, 159], [127, 157, 159], [157, 160, 159], [162, 158, 161], [158, 2, 161], [114, 159, 163], [159, 164, 163], [2, 42, 165], [166, 161, 165], [161, 2, 165], [114, 163, 167], [165, 42, 168], [114, 167, 169], [172, 171, 170], [175, 174, 173], [177, 173, 176], [170, 179, 178], [180, 168, 43], [174, 180, 43], [168, 42, 43], [173, 174, 43], [169, 172, 110], [114, 169, 110], [172, 170, 110], [173, 43, 50], [110, 170, 104], [183, 182, 181], [186, 185, 184], [188, 184, 187], [181, 190, 189], [173, 50, 53], [104, 170, 101], [176, 173, 59], [173, 53, 59], [191, 176, 59], [192, 191, 59], [170, 178, 97], [101, 170, 97], [194, 193, 97], [178, 194, 97], [183, 181, 93], [97, 193, 93], [193, 183, 93], [184, 185, 61], [185, 192, 61], [192, 59, 61], [93, 181, 87], [184, 61, 67], [87, 181, 84], [184, 67, 70], [181, 189, 77], [196, 195, 77], [189, 196, 77], [84, 181, 77], [187, 184, 76], [195, 187, 76], [184, 70, 76], [77, 195, 76], [148, 197, 149], [148, 152, 197], [152, 198, 197], [152, 154, 198], [154, 199, 198], [202, 201, 200], [200, 201, 203], [206, 205, 204], [207, 206, 204], [203, 201, 144], [144, 149, 197], [208, 203, 198], [203, 144, 198], [144, 197, 198], [208, 198, 199], [205, 208, 209], [208, 199, 209], [210, 162, 161], [209, 210, 161], [205, 209, 161], [204, 205, 161], [213, 212, 211], [211, 212, 214], [216, 215, 201], [217, 216, 201], [214, 212, 146], [146, 147, 218], [220, 214, 219], [214, 146, 219], [146, 218, 219], [215, 220, 221], [220, 219, 221], [201, 215, 222], [215, 221, 222], [223, 145, 144], [222, 223, 144], [201, 222, 144], [143, 218, 147], [141, 219, 143], [143, 219, 218], [141, 221, 219], [141, 140, 221], [140, 222, 221], [140, 142, 222], [142, 223, 222], [142, 145, 223], [226, 225, 224], [224, 225, 227], [229, 228, 212], [230, 229, 212], [227, 225, 159], [159, 160, 231], [233, 227, 232], [227, 159, 232], [159, 231, 232], [233, 232, 234], [228, 233, 235], [233, 234, 235], [236, 151, 146], [235, 236, 146], [228, 235, 146], [212, 228, 146], [157, 231, 160], [155, 232, 157], [157, 232, 231], [155, 234, 232], [155, 153, 234], [153, 235, 234], [153, 150, 235], [150, 236, 235], [150, 151, 236], [239, 238, 237], [237, 238, 240], [242, 241, 225], [243, 242, 225], [240, 238, 170], [170, 171, 244], [246, 240, 245], [240, 170, 245], [170, 244, 245], [246, 245, 247], [241, 246, 248], [246, 247, 248], [249, 164, 159], [248, 249, 159], [241, 248, 159], [225, 241, 159], [172, 244, 171], [169, 245, 172], [172, 245, 244], [169, 247, 245], [169, 167, 247], [167, 248, 247], [167, 163, 248], [163, 249, 248], [163, 164, 249], [252, 251, 250], [250, 251, 253], [255, 254, 238], [256, 255, 238], [253, 251, 181], [181, 182, 257], [259, 253, 258], [253, 181, 258], [181, 257, 258], [259, 258, 260], [254, 259, 261], [259, 260, 261], [262, 179, 170], [261, 262, 170], [254, 261, 170], [238, 254, 170], [183, 257, 182], [193, 258, 183], [183, 258, 257], [193, 260, 258], [193, 194, 260], [194, 261, 260], [194, 178, 261], [178, 262, 261], [178, 179, 262], [265, 264, 263], [263, 264, 266], [268, 267, 251], [269, 268, 251], [266, 264, 184], [184, 188, 270], [272, 266, 271], [266, 184, 271], [184, 270, 271], [267, 272, 273], [272, 271, 273], [267, 273, 274], [275, 190, 181], [274, 275, 181], [251, 267, 181], [267, 274, 181], [187, 270, 188], [195, 271, 187], [187, 271, 270], [195, 273, 271], [195, 196, 273], [196, 274, 273], [196, 189, 274], [189, 275, 274], [189, 190, 275], [278, 277, 276], [276, 277, 279], [281, 280, 264], [282, 281, 264], [279, 277, 173], [173, 177, 283], [285, 279, 284], [279, 173, 284], [173, 283, 284], [285, 284, 286], [280, 285, 287], [285, 286, 287], [288, 186, 184], [287, 288, 184], [280, 287, 184], [264, 280, 184], [176, 283, 177], [191, 284, 176], [176, 284, 283], [191, 286, 284], [191, 192, 286], [192, 287, 286], [192, 185, 287], [185, 288, 287], [185, 186, 288], [290, 204, 289], [289, 204, 291], [293, 292, 277], [294, 293, 277], [291, 204, 161], [161, 166, 295], [297, 291, 296], [291, 161, 296], [161, 295, 296], [292, 297, 298], [297, 296, 298], [277, 292, 299], [292, 298, 299], [300, 175, 173], [299, 300, 173], [277, 299, 173], [165, 295, 166], [168, 296, 165], [165, 296, 295], [168, 298, 296], [168, 180, 298], [180, 299, 298], [180, 174, 299], [174, 300, 299], [174, 175, 300], [156, 209, 154], [154, 209, 199], [158, 210, 156], [156, 210, 209], [158, 162, 210], [208, 205, 301], [205, 302, 301], [205, 206, 302], [206, 303, 302], [206, 207, 303], [200, 304, 202], [203, 305, 200], [200, 305, 304], [208, 301, 203], [203, 301, 305], [211, 306, 213], [211, 214, 306], [214, 307, 306], [214, 220, 307], [215, 308, 220], [220, 308, 307], [216, 309, 215], [215, 309, 308], [216, 217, 309], [224, 310, 226], [224, 227, 310], [227, 311, 310], [227, 233, 311], [228, 312, 233], [233, 312, 311], [229, 313, 228], [228, 313, 312], [229, 230, 313], [237, 314, 239], [237, 240, 314], [240, 315, 314], [240, 246, 315], [241, 316, 246], [246, 316, 315], [242, 317, 241], [241, 317, 316], [242, 243, 317], [250, 318, 252], [250, 253, 318], [253, 319, 318], [253, 259, 319], [254, 320, 259], [259, 320, 319], [255, 321, 254], [254, 321, 320], [255, 256, 321], [263, 322, 265], [263, 266, 322], [266, 323, 322], [266, 272, 323], [267, 324, 272], [272, 324, 323], [268, 325, 267], [267, 325, 324], [268, 269, 325], [276, 326, 278], [276, 279, 326], [279, 327, 326], [279, 285, 327], [280, 328, 285], [285, 328, 327], [281, 329, 280], [280, 329, 328], [281, 282, 329], [289, 330, 290], [289, 291, 330], [291, 331, 330], [291, 297, 331], [292, 332, 297], [297, 332, 331], [293, 333, 292], [292, 333, 332], [293, 294, 333], [112, 111, 315], [112, 315, 316], [315, 111, 314], [112, 316, 317], [111, 95, 238], [314, 111, 238], [314, 238, 239], [133, 112, 225], [317, 243, 225], [112, 317, 225], [225, 226, 310], [133, 225, 310], [238, 95, 321], [256, 238, 321], [133, 310, 311], [321, 95, 320], [95, 94, 319], [320, 95, 319], [134, 133, 312], [133, 311, 312], [319, 94, 318], [134, 312, 313], [134, 313, 212], [20, 134, 212], [313, 230, 212], [94, 83, 251], [318, 94, 251], [252, 318, 251], [20, 212, 306], [212, 213, 306], [251, 83, 325], [269, 251, 325], [20, 306, 307], [325, 83, 324], [324, 83, 323], [20, 307, 308], [265, 322, 264], [309, 217, 201], [201, 202, 304], [282, 264, 329], [278, 326, 277], [303, 207, 204], [294, 277, 333], [204, 290, 330], [20, 308, 21], [308, 309, 21], [309, 201, 21], [323, 83, 82], [264, 322, 82], [322, 323, 82], [304, 305, 27], [305, 301, 27], [201, 304, 27], [21, 201, 27], [328, 329, 66], [329, 264, 66], [264, 82, 66], [27, 301, 28], [301, 302, 28], [302, 303, 28], [303, 204, 28], [328, 66, 65], [326, 327, 65], [327, 328, 65], [277, 326, 65], [277, 65, 49], [331, 332, 49], [332, 333, 49], [333, 277, 49], [331, 49, 48], [28, 204, 48], [330, 331, 48], [204, 330, 48]],convexity=10);
